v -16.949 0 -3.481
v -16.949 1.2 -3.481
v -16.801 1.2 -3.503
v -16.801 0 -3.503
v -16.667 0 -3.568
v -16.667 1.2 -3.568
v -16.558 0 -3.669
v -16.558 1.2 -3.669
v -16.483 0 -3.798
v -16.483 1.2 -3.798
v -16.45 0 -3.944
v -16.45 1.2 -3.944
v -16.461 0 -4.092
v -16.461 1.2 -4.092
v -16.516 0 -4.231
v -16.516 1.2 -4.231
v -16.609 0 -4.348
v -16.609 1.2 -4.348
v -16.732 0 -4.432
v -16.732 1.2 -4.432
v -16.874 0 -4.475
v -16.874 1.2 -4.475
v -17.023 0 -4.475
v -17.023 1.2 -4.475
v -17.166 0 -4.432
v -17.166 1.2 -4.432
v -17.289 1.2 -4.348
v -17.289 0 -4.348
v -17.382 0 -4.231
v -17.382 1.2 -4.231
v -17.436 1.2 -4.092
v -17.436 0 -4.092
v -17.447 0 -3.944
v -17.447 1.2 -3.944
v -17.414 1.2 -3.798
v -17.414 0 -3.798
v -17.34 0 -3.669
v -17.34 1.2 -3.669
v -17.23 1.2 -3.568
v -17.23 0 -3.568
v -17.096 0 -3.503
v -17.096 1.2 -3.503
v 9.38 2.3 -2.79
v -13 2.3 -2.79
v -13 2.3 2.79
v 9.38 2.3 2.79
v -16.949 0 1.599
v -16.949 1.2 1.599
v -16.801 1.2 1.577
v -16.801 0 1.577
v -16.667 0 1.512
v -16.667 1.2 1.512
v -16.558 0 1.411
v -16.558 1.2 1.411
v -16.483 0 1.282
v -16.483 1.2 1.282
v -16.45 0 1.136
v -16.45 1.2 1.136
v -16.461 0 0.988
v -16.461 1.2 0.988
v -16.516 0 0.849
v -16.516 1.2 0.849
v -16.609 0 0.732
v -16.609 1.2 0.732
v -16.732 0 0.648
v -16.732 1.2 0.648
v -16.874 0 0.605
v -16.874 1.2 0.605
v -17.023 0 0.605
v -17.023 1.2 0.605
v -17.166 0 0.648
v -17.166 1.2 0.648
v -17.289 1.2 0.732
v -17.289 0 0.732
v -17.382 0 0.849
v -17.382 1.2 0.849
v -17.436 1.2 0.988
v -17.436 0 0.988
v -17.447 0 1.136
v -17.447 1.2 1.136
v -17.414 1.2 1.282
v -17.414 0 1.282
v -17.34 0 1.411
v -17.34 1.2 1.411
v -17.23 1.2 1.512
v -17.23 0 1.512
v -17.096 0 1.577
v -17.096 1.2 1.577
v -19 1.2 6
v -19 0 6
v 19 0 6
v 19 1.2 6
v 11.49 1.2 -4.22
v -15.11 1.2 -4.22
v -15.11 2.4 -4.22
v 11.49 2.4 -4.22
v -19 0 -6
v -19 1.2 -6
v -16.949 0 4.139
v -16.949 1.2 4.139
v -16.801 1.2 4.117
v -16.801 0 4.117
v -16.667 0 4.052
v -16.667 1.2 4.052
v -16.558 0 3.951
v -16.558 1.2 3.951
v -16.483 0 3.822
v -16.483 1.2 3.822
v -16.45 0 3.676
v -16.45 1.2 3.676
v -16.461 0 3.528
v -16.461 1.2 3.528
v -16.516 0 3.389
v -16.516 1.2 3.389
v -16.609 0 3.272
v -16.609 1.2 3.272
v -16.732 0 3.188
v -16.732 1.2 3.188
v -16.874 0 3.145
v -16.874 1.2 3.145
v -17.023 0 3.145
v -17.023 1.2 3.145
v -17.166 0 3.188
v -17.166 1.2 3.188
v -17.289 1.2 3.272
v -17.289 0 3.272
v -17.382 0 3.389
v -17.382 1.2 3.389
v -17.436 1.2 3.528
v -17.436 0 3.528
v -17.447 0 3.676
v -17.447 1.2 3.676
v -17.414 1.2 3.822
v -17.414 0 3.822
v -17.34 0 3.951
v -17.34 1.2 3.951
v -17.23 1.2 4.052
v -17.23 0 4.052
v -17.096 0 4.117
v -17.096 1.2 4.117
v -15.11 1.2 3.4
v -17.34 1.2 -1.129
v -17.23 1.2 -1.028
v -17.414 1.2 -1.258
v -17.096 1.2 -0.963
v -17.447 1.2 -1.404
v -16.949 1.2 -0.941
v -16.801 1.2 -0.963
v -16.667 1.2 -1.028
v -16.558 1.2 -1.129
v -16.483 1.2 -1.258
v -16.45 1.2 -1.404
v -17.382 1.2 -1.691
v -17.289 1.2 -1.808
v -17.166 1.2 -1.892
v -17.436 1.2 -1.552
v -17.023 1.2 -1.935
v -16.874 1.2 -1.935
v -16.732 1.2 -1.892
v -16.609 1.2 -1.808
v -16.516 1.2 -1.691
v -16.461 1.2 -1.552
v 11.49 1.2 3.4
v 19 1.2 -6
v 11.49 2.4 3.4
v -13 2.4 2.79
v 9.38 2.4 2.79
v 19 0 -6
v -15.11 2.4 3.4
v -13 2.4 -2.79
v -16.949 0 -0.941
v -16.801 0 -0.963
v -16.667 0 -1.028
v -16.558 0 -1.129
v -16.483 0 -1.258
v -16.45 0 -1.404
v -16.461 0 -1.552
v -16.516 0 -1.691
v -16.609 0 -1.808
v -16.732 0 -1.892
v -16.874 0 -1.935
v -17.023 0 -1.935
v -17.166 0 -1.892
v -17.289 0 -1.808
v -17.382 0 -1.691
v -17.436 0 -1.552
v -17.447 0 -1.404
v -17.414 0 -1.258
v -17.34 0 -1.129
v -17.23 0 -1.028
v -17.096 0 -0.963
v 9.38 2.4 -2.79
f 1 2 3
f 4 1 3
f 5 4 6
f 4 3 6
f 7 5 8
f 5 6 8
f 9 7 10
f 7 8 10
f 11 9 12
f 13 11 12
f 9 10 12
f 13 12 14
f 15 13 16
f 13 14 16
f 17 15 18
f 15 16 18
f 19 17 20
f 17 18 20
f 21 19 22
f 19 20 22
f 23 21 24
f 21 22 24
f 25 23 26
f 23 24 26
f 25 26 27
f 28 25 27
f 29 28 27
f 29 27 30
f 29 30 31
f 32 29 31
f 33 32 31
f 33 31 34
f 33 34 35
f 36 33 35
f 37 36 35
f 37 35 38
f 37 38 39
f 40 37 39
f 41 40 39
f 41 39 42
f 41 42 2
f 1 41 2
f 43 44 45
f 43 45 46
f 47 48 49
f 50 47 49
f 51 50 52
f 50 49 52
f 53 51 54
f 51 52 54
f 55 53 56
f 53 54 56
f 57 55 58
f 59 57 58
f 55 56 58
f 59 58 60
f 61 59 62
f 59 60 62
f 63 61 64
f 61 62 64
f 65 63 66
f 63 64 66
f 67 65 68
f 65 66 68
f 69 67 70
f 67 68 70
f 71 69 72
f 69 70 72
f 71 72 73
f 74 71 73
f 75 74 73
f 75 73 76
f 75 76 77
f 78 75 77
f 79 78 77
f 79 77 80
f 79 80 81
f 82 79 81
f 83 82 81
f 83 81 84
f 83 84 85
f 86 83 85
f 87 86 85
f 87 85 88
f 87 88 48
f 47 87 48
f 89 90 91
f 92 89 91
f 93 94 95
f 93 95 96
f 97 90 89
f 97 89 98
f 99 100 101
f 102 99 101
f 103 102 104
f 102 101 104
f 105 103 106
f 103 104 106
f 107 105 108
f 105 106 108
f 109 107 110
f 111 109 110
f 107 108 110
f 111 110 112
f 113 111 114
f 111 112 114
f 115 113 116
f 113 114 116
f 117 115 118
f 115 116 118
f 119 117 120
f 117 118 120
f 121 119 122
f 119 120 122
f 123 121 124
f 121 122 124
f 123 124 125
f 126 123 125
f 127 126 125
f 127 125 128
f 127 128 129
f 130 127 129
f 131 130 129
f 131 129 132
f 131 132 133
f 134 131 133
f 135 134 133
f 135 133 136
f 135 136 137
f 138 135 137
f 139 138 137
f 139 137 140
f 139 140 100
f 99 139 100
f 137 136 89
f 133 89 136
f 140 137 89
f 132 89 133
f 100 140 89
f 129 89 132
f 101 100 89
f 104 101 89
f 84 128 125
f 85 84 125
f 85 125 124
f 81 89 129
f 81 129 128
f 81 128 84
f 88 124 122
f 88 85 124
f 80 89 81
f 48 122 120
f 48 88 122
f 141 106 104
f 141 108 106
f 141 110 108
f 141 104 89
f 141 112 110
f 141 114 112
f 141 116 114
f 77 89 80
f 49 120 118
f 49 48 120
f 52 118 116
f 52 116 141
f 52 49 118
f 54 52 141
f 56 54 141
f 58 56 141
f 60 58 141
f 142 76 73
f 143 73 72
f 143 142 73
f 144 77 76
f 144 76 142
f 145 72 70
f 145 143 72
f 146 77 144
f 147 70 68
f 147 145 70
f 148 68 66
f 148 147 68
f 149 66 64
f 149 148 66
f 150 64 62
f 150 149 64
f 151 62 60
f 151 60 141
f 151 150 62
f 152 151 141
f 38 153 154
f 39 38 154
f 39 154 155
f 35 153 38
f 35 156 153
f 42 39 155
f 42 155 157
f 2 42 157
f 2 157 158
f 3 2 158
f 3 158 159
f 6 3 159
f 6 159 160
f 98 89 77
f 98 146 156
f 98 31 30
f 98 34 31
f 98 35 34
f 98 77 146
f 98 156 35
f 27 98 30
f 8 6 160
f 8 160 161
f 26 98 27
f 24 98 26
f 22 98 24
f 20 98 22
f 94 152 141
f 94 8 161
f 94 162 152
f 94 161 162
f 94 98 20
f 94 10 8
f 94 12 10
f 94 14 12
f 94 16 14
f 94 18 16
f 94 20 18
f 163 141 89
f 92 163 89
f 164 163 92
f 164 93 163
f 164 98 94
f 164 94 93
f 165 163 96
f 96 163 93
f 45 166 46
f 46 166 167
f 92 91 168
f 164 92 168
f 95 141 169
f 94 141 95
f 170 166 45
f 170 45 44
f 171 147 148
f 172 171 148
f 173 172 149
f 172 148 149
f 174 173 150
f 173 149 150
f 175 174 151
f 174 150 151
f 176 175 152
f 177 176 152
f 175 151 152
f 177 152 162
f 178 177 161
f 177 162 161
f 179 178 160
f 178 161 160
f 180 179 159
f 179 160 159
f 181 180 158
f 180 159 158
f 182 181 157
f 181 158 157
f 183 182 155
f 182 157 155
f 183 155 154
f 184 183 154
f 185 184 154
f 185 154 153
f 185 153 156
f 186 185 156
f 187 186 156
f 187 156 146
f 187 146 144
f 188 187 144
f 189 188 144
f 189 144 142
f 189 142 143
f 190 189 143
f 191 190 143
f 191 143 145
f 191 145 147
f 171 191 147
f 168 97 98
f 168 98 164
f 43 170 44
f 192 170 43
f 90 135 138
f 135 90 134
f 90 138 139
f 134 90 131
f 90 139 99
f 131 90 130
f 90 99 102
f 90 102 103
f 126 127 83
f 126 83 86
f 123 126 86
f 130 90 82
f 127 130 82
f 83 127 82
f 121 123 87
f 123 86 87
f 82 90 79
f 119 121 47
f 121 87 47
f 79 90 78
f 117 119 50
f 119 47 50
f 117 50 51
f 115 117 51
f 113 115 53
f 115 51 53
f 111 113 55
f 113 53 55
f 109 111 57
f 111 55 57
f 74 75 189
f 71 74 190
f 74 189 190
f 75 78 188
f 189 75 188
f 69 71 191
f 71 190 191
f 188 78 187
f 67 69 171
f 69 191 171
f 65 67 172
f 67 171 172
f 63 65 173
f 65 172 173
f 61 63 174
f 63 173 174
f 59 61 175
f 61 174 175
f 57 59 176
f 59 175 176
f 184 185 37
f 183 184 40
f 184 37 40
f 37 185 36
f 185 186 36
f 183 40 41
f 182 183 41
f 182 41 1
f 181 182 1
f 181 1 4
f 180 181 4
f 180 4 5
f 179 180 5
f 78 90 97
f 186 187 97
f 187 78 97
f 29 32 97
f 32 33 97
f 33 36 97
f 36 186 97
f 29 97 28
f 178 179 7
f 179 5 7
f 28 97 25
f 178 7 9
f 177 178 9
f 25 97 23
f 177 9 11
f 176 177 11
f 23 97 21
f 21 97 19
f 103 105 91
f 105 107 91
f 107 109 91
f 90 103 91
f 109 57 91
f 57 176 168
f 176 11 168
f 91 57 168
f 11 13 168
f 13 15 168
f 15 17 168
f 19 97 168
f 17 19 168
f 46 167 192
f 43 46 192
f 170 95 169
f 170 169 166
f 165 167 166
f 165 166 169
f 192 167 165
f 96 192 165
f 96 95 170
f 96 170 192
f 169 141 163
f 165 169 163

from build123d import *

# Parameters (mm, degrees)
SKETCH1_W           = 38
SKETCH1_H           = 12
BOSS_EXTRUDE1_DEPTH = 1.2
SKETCH2_W           = 26.6
SKETCH2_H           = 7.62
BOSS_EXTRUDE2_DEPTH = 1.2
SKETCH3_W           = 22.38
SKETCH3_H           = 5.58
CUT_EXTRUDE1_DEPTH  = 0.1
SKETCH4_R           = 0.5
CUT_EXTRUDE2_DEPTH  = 20.960961901


with BuildPart() as part:
    # Sketch1 → Boss-Extrude1 (new body)
    with BuildSketch(Plane(origin=(0, 0, 0), x_dir=(1, 0, 0), z_dir=(0, 1, 0))):
        Rectangle(SKETCH1_W, SKETCH1_H)
    extrude(amount=BOSS_EXTRUDE1_DEPTH)

    # Sketch2 → Boss-Extrude2 (add)
    with BuildSketch(Plane(origin=(0, 1.2, 0), x_dir=(1, 0, 0), z_dir=(0, 1, 0))):
        with Locations((-1.81, 0.41)):
            Rectangle(SKETCH2_W, SKETCH2_H)
    extrude(amount=BOSS_EXTRUDE2_DEPTH)

    # Sketch3 → Cut-Extrude1 (cut)
    with BuildSketch(Plane(origin=(0, 2.4, 0), x_dir=(1, 0, 0), z_dir=(0, 1, 0))):
        with Locations((-1.81, 0)):
            Rectangle(SKETCH3_W, SKETCH3_H)
    extrude(amount=-CUT_EXTRUDE1_DEPTH, mode=Mode.SUBTRACT)

    # Sketch4 → Cut-Extrude2 (cut, through all)
    with BuildSketch(Plane(origin=(0, 1.2, 0), x_dir=(1, 0, 0), z_dir=(0, 1, 0))):
        with Locations(Location((-16.948688295, 3.981018796, 0), (0, 0, 270))):
            Circle(SKETCH4_R)
        with Locations(Location((-16.948688295, 1.441018796, 0), (0, 0, 270))):
            Circle(SKETCH4_R)
        with Locations(Location((-16.948688295, -1.098981204, 0), (0, 0, 270))):
            Circle(SKETCH4_R)
        with Locations(Location((-16.948688295, -3.638981204, 0), (0, 0, 270))):
            Circle(SKETCH4_R)
    extrude(amount=-CUT_EXTRUDE2_DEPTH, mode=Mode.SUBTRACT)


solid = part.part
